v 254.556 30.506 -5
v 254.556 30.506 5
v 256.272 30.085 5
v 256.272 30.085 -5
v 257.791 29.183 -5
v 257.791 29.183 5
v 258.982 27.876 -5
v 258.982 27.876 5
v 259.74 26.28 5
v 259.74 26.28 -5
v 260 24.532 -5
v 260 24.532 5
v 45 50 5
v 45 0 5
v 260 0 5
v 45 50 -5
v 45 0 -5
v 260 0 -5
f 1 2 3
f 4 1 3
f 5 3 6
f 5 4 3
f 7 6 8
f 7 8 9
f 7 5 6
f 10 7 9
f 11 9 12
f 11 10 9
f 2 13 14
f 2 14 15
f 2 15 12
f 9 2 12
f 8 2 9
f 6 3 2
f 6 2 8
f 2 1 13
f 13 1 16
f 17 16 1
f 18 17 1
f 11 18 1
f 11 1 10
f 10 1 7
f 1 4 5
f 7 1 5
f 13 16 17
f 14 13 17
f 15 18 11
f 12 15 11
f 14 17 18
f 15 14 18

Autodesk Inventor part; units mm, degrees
ref_plane "YZ Plane" through (0, 0, 0) normal (1, 0, 0) x (0, 1, 0)
ref_plane "XZ Plane" through (0, 0, 0) normal (0, 1, 0) x (-1, 0, 0)
ref_plane "XY Plane" through (0, 0, 0) normal (0, 0, 1) x (1, 0, 0)
sketch "Sketch3" plane through (0, 0, 0) normal (0, 0, 1) x (1, 0, 0)
  line L0 (0, 0) -> (260, 0)
  line L1 (260, 0) -> (260, 30)
  line L2 (260, 30) -> (-45.1628, 58.3872)
  line L3 (45, 50) -> (45, 0)
  dimension "d11" = 260
  dimension "d12" = 30
  dimension "d13" = 45
  dimension "d14" = 50
extrude "Plate1" add sketch "Sketch3" along normal mid plane 10
fillet "Corner Round1" radius 6 1 edges at (260, 30, 0)
equation "\"d15\" = Thickness"
equation "\"BendReliefDepth\" = 0.5 * Thickness"
equation "\"Thickness\" = 10"
properties part number "PRS 940-23 charging hatch reinf 500mm" material "Steel"
